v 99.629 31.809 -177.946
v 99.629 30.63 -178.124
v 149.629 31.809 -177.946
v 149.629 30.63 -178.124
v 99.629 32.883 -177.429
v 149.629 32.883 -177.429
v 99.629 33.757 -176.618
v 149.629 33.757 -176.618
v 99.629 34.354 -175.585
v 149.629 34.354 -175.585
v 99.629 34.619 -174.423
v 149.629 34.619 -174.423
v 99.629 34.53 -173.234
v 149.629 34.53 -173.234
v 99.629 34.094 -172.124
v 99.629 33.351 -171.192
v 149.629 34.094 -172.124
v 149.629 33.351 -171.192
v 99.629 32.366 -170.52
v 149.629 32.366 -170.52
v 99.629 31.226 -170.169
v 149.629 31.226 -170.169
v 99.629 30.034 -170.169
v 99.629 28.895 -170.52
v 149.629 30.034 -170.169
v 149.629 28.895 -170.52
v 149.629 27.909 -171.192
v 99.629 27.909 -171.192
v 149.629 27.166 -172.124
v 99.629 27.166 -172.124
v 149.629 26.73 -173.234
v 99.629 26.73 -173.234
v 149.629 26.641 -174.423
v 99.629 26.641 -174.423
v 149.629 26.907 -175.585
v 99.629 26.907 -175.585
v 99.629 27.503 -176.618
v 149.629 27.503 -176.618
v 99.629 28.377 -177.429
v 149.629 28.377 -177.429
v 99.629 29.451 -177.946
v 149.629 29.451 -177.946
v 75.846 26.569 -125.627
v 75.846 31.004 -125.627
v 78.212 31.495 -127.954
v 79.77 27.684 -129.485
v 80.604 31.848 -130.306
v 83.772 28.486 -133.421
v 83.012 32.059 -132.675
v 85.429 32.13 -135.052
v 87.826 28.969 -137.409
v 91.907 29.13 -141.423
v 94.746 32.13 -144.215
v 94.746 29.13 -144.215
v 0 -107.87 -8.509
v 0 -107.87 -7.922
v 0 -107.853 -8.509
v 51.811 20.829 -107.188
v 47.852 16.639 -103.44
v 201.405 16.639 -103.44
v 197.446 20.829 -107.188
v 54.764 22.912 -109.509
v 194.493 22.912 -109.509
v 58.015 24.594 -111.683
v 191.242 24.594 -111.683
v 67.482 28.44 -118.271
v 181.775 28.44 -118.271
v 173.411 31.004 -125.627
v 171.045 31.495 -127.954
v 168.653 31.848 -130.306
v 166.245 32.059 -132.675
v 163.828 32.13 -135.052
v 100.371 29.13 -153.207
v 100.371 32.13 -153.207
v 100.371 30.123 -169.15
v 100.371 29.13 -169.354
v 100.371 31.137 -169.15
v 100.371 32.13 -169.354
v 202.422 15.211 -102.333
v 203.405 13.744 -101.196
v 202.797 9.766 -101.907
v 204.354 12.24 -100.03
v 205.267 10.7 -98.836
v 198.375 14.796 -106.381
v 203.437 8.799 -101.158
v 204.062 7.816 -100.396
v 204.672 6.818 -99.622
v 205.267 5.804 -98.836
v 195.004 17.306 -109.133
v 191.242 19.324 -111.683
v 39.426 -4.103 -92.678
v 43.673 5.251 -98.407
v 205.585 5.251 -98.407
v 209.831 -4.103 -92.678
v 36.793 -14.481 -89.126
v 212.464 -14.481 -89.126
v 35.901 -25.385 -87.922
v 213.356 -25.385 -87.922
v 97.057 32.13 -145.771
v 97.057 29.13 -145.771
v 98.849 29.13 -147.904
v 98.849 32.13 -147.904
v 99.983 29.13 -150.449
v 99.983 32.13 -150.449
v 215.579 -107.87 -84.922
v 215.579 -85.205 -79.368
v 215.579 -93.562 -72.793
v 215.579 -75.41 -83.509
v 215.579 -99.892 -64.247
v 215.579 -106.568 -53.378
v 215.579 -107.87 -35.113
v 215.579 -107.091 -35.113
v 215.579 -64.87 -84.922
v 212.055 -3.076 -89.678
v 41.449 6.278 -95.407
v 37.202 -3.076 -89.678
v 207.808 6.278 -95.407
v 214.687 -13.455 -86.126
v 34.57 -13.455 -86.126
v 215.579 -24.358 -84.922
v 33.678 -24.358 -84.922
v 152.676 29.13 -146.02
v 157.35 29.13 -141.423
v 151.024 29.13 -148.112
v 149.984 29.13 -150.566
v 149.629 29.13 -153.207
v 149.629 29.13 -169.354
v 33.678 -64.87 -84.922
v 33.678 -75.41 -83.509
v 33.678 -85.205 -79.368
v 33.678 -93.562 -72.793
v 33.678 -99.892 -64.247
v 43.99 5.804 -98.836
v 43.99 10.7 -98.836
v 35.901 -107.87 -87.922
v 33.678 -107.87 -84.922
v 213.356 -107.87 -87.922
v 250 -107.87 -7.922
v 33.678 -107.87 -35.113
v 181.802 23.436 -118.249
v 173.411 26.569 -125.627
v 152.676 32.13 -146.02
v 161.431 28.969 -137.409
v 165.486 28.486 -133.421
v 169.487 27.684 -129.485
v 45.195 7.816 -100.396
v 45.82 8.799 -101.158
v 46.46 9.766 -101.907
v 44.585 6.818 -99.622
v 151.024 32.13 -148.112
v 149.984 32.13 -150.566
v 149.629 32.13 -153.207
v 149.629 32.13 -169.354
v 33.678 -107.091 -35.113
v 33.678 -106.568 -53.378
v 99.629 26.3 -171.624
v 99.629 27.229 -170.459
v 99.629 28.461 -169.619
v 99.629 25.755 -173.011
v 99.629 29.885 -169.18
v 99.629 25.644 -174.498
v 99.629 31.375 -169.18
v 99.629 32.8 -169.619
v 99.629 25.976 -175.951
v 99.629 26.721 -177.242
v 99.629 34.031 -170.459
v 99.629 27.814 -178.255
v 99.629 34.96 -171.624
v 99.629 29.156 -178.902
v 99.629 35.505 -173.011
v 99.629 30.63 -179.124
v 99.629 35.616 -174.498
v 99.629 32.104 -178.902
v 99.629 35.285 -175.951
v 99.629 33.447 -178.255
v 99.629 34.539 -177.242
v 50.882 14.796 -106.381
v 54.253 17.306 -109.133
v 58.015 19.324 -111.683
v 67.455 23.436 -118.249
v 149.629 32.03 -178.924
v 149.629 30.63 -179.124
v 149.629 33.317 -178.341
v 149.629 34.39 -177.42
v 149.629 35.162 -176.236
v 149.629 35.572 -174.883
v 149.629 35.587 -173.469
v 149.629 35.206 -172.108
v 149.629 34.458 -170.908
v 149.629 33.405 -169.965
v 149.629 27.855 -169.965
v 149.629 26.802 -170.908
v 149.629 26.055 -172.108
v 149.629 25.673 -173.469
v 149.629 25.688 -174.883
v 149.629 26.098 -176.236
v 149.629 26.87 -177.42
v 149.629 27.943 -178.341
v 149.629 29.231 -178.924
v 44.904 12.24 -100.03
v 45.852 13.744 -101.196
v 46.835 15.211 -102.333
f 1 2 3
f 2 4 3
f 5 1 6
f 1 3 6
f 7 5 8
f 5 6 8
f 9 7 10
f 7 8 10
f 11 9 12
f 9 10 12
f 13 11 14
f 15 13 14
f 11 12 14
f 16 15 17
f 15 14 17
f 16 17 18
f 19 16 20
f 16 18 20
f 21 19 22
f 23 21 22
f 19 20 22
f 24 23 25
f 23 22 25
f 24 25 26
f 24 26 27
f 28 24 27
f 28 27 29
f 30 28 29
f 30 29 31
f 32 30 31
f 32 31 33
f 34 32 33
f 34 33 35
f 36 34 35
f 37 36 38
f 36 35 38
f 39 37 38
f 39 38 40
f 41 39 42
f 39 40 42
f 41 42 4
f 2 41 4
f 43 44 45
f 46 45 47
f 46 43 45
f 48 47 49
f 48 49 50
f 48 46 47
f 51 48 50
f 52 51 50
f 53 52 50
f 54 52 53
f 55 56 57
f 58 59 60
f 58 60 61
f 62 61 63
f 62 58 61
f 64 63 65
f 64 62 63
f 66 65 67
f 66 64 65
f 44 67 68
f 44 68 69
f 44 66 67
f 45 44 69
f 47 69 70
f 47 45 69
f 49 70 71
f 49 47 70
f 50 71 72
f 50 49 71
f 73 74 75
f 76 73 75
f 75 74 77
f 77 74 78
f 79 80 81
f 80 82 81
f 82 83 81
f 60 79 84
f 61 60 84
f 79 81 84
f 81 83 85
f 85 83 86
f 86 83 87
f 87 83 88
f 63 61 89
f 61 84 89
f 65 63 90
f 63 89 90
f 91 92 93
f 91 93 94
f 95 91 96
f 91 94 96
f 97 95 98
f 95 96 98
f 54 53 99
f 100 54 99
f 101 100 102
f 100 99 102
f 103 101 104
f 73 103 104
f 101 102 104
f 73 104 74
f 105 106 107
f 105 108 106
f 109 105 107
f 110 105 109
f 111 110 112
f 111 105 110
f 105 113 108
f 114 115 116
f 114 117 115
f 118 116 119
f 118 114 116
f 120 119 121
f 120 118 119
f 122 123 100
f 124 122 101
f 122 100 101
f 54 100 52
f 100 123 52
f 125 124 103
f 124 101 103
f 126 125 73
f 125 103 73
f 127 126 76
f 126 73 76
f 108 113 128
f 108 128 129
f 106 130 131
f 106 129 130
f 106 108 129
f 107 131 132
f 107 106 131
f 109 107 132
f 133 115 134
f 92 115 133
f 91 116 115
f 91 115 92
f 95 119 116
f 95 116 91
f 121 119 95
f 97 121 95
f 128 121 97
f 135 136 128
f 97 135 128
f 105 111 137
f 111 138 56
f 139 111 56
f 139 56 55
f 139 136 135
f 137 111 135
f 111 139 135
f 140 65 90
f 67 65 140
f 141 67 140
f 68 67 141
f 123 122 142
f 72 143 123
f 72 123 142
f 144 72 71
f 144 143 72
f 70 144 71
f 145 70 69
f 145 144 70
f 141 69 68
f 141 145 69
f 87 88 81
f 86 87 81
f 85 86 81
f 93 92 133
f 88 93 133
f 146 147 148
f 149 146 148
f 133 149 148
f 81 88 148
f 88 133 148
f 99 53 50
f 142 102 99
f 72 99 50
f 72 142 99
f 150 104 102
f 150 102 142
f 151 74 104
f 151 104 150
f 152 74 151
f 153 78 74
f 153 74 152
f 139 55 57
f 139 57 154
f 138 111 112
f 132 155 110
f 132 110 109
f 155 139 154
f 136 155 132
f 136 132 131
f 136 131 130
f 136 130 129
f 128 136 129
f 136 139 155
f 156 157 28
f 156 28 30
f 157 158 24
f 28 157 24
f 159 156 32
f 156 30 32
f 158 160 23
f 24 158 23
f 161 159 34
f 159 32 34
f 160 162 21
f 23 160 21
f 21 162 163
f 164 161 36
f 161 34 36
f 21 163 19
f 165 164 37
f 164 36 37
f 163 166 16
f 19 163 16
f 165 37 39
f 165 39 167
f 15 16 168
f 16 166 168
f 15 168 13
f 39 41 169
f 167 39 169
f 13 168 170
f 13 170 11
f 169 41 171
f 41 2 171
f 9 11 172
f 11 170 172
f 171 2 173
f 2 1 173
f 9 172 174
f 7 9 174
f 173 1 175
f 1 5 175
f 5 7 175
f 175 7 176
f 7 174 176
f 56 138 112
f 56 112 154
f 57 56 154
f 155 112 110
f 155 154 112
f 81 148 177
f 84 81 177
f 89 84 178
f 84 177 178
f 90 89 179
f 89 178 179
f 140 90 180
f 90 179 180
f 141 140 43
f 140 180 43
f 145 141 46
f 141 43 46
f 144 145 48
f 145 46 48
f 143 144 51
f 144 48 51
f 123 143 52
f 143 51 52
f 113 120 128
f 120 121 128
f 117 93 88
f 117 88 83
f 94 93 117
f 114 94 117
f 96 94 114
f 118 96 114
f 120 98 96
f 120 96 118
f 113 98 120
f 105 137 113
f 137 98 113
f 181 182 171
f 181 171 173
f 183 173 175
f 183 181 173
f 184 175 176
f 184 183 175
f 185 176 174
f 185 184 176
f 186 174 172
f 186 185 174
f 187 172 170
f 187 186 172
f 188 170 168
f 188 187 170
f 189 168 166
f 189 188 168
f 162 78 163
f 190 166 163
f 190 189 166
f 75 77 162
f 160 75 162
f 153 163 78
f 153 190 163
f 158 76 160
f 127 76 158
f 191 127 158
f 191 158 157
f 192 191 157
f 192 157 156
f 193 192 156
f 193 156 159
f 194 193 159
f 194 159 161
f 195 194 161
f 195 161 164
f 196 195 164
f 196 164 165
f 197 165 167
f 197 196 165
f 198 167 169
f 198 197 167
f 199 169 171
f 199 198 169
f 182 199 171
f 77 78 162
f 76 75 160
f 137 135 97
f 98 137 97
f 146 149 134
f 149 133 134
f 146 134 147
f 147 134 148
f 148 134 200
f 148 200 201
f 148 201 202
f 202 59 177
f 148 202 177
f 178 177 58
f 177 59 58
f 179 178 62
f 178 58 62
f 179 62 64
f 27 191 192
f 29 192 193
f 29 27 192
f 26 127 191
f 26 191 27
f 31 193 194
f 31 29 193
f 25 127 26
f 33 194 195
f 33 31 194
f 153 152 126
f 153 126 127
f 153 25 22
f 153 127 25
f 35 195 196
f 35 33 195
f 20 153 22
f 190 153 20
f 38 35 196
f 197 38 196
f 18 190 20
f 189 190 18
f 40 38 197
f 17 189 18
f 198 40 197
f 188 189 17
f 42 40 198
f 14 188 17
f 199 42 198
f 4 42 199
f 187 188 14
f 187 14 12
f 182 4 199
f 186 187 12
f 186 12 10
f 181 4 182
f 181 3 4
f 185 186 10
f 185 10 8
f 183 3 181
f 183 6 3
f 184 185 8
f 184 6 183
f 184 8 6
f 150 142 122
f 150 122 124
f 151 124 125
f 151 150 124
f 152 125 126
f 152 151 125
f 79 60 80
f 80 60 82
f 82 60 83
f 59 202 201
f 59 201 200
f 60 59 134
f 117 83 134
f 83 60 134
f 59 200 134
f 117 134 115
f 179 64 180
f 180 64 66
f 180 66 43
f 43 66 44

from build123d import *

# Parameters (mm, degrees)
BOSS_EXTRUDE1_DEPTH     = 250
FILLET1_R               = 40
SKETCH13_W              = 49.257086068
SKETCH13_H              = 61.833319097
BOSS_EXTRUDE5_DEPTH     = 3
SKETCH14_R              = 5
SKETCH14_R_2            = 4
BOSS_EXTRUDE6_DEPTH     = 50
SKETCH15_R              = 4
CUT_EXTRUDE5_DEPTH      = 50
FILLET5_R               = 10
CUT_EXTRUDE6_DEPTH      = 326.916158871
CUT_EXTRUDE6_DEPTH_BACK = 326.916158871
CUT_EXTRUDE7_DEPTH      = 301.326149824
CUT_EXTRUDE7_DEPTH_BACK = 301.326149824
FILLET6_R               = 50
FILLET7_R               = 50
FILLET8_R               = 50
FILLET9_R               = 50
FILLET10_R              = 50
FILLET11_R              = 100
FILLET12_START          = 43.99041169
FILLET12_DEPTH          = 161.276262689


with BuildPart() as part:
    # Sketch1 → Boss-Extrude1 (new body)
    with BuildSketch(Plane(origin=(0, 0, 0), x_dir=(0, 0, -1), z_dir=(1, 0, 0))):
        Polygon((84.922374429, -7.245973585), (84.922374429, -104.869861266), (7.922374429, -104.869861266), (7.922374429, -107.869861266), (87.922374429, -107.869861266), (87.922374429, -8.272692249), (116.920297026, 29.130138734), (143.207419357, 29.130138734), (143.207419357, 32.130138734), (115.450156075, 32.130138734), align=None)
    extrude(amount=BOSS_EXTRUDE1_DEPTH)

    # Fillet1
    fillet1_edges = [part.edges().sort_by_distance(p)[0] for p in [
        (125, -104.869861266, -84.922374429),
    ]]
    fillet(fillet1_edges, radius=FILLET1_R)

    # Sketch13 → Boss-Extrude5 (add)
    with BuildSketch(Plane(origin=(0, 32.130138734, 0), x_dir=(1, 0, 0), z_dir=(0, 1, 0))):
        with Locations((125, 143.207419358)):
            Rectangle(SKETCH13_W, SKETCH13_H)
    extrude(amount=-BOSS_EXTRUDE5_DEPTH)

    # Sketch14 → Boss-Extrude6 (add)
    with BuildSketch(Plane(origin=(149.628543034, 0, 0), x_dir=(0, 0, -1), z_dir=(1, 0, 0))):
        with Locations((174.124078906, 30.630138734)):
            Circle(SKETCH14_R)
        with Locations((174.124078906, 30.630138734)):
            Circle(SKETCH14_R_2, mode=Mode.SUBTRACT)
    extrude(amount=-BOSS_EXTRUDE6_DEPTH)

    # Sketch15 → Cut-Extrude5 (cut)
    with BuildSketch(Plane(origin=(149.628543034, 0, 0), x_dir=(0, 0, -1), z_dir=(1, 0, 0))):
        with Locations((174.124078906, 30.630138734)):
            Circle(SKETCH15_R)
    extrude(amount=-CUT_EXTRUDE5_DEPTH, mode=Mode.SUBTRACT)

    # Fillet5
    fillet5_edges = [part.edges().sort_by_distance(p)[0] for p in [
        (149.628543034, 30.630138734, -143.207419357),
        (100.371456966, 30.630138734, -143.207419357),
    ]]
    fillet(fillet5_edges, radius=FILLET5_R)

    # Sketch16 → Cut-Extrude6 (cut, two sides: drawn at the far end of the back side and taken through both)
    with BuildSketch(Plane(origin=(0, 0, 0), x_dir=(1, 0, 0), z_dir=(0, 1, 0)).offset(-CUT_EXTRUDE6_DEPTH_BACK)):
        Polygon((152.557475223, 146.136351545), (183.758090757, 115.450156075), (192.952340186, 115.450156075), (215.579344221, 84.922374429), (215.579344221, 35.113164703), (250, 7.922374429), (290.889121347, 148.865149358), (190.317133447, 171.001918434), align=None)
        Polygon((56.304745883, 115.450156075), (65.498995311, 115.450156075), (96.699610846, 146.136351545), (58.939952622, 171.001918434), (-41.632035279, 148.865149358), (-0.742913931, 7.922374429), (33.677741848, 35.113164703), (33.677741848, 84.922374429), align=None)
    extrude(amount=CUT_EXTRUDE6_DEPTH + CUT_EXTRUDE6_DEPTH_BACK, mode=Mode.SUBTRACT)

    # Sketch20 → Cut-Extrude7 (cut, two sides: drawn at the far end of the back side and taken through both)
    with BuildSketch(Plane(origin=(215.579344221, 0, 0), x_dir=(0, 0, -1), z_dir=(1, 0, 0)).offset(-CUT_EXTRUDE7_DEPTH_BACK)):
        Polygon((7.922374429, -107.869861266), (53.377825638, -106.568275865), (64.247416618, -99.891893537), (2.905628415, -97.28009186), (4.033474998, -102.693755458), align=None)
    extrude(amount=CUT_EXTRUDE7_DEPTH + CUT_EXTRUDE7_DEPTH_BACK, mode=Mode.SUBTRACT)

    # Fillet6
    fillet6_edges = [part.edges().sort_by_distance(p)[0] for p in [
        (124.628543034, -7.245973585, -84.922374429),
    ]]
    fillet(fillet6_edges, radius=FILLET6_R)

    # Fillet7
    fillet7_edges = [part.edges().sort_by_distance(p)[0] for p in [
        (124.628543034, -8.272692249, -87.922374429),
    ]]
    fillet(fillet7_edges, radius=FILLET7_R)

    # Fillet8
    fillet8_edges = [part.edges().sort_by_distance(p)[0] for p in [
        (124.628543034, 29.130138734, -116.920297026),
    ]]
    fillet(fillet8_edges, radius=FILLET8_R)

    # Fillet9
    # the kernel refuses this fillet: 50 mm, written as the material it takes off along each edge
    with BuildSketch(Plane(origin=(192.952340186, -29.84551843, -115.450156075), x_dir=(0.5954625750047567, 0, 0.8033830479719526), z_dir=(0, 1, 0))) as fillet9_piece_1:
        with BuildLine():
            CenterArc((20.680282204, -50), FILLET9_R, 90, 31.540576836)
            Line((-5.47483144, -7.38650413), (0, 0))
            Line((0, 0), (20.680282204, 0))
        make_face()
    extrude(amount=113.676362673, mode=Mode.SUBTRACT)

    # Fillet10
    # the kernel refuses this fillet: 50 mm, written as the material it takes off along each edge
    with BuildSketch(Plane(origin=(56.304745883, 83.830844243, -115.450156075), x_dir=(-0.5954625750047574, 0, 0.8033830479719519), z_dir=(0, -1, 0))) as fillet10_piece_1:
        with BuildLine():
            CenterArc((20.680282204, -50), FILLET10_R, 90, 31.540576836)
            Line((-5.47483144, -7.38650413), (0, 0))
            Line((0, 0), (20.680282204, 0))
        make_face()
    extrude(amount=113.676362673, mode=Mode.SUBTRACT)

    # Fillet11
    fillet11_edges = [part.edges().sort_by_distance(p)[0] for p in [
        (65.498995311, 26.992662907, -115.450156075),
        (183.758090757, 26.992662907, -115.450156075),
    ]]
    fillet(fillet11_edges, radius=FILLET11_R)

    # Fillet12: read off the stored shape, not the designer's step
    # Fillet12 outline → Fillet12 (cut)
    with BuildSketch(Plane.YZ.offset(FILLET12_START)):
        with BuildLine():
            Line((29.130138734, -113.124295559), (16.638670002, -103.439824252))
            ThreePointArc((16.638670002, -103.439824252), (28.049083949, -117.450064663), (32.130138734, -135.052035423))
            Line((32.130138734, -135.052035423), (32.130138734, -112.290759809))
            Line((32.130138734, -112.290759809), (29.130138734, -112.290759809))
            Line((29.130138734, -112.290759809), (29.130138734, -113.124295559))
        make_face()
    extrude(amount=FILLET12_DEPTH, mode=Mode.SUBTRACT)


solid = part.part
